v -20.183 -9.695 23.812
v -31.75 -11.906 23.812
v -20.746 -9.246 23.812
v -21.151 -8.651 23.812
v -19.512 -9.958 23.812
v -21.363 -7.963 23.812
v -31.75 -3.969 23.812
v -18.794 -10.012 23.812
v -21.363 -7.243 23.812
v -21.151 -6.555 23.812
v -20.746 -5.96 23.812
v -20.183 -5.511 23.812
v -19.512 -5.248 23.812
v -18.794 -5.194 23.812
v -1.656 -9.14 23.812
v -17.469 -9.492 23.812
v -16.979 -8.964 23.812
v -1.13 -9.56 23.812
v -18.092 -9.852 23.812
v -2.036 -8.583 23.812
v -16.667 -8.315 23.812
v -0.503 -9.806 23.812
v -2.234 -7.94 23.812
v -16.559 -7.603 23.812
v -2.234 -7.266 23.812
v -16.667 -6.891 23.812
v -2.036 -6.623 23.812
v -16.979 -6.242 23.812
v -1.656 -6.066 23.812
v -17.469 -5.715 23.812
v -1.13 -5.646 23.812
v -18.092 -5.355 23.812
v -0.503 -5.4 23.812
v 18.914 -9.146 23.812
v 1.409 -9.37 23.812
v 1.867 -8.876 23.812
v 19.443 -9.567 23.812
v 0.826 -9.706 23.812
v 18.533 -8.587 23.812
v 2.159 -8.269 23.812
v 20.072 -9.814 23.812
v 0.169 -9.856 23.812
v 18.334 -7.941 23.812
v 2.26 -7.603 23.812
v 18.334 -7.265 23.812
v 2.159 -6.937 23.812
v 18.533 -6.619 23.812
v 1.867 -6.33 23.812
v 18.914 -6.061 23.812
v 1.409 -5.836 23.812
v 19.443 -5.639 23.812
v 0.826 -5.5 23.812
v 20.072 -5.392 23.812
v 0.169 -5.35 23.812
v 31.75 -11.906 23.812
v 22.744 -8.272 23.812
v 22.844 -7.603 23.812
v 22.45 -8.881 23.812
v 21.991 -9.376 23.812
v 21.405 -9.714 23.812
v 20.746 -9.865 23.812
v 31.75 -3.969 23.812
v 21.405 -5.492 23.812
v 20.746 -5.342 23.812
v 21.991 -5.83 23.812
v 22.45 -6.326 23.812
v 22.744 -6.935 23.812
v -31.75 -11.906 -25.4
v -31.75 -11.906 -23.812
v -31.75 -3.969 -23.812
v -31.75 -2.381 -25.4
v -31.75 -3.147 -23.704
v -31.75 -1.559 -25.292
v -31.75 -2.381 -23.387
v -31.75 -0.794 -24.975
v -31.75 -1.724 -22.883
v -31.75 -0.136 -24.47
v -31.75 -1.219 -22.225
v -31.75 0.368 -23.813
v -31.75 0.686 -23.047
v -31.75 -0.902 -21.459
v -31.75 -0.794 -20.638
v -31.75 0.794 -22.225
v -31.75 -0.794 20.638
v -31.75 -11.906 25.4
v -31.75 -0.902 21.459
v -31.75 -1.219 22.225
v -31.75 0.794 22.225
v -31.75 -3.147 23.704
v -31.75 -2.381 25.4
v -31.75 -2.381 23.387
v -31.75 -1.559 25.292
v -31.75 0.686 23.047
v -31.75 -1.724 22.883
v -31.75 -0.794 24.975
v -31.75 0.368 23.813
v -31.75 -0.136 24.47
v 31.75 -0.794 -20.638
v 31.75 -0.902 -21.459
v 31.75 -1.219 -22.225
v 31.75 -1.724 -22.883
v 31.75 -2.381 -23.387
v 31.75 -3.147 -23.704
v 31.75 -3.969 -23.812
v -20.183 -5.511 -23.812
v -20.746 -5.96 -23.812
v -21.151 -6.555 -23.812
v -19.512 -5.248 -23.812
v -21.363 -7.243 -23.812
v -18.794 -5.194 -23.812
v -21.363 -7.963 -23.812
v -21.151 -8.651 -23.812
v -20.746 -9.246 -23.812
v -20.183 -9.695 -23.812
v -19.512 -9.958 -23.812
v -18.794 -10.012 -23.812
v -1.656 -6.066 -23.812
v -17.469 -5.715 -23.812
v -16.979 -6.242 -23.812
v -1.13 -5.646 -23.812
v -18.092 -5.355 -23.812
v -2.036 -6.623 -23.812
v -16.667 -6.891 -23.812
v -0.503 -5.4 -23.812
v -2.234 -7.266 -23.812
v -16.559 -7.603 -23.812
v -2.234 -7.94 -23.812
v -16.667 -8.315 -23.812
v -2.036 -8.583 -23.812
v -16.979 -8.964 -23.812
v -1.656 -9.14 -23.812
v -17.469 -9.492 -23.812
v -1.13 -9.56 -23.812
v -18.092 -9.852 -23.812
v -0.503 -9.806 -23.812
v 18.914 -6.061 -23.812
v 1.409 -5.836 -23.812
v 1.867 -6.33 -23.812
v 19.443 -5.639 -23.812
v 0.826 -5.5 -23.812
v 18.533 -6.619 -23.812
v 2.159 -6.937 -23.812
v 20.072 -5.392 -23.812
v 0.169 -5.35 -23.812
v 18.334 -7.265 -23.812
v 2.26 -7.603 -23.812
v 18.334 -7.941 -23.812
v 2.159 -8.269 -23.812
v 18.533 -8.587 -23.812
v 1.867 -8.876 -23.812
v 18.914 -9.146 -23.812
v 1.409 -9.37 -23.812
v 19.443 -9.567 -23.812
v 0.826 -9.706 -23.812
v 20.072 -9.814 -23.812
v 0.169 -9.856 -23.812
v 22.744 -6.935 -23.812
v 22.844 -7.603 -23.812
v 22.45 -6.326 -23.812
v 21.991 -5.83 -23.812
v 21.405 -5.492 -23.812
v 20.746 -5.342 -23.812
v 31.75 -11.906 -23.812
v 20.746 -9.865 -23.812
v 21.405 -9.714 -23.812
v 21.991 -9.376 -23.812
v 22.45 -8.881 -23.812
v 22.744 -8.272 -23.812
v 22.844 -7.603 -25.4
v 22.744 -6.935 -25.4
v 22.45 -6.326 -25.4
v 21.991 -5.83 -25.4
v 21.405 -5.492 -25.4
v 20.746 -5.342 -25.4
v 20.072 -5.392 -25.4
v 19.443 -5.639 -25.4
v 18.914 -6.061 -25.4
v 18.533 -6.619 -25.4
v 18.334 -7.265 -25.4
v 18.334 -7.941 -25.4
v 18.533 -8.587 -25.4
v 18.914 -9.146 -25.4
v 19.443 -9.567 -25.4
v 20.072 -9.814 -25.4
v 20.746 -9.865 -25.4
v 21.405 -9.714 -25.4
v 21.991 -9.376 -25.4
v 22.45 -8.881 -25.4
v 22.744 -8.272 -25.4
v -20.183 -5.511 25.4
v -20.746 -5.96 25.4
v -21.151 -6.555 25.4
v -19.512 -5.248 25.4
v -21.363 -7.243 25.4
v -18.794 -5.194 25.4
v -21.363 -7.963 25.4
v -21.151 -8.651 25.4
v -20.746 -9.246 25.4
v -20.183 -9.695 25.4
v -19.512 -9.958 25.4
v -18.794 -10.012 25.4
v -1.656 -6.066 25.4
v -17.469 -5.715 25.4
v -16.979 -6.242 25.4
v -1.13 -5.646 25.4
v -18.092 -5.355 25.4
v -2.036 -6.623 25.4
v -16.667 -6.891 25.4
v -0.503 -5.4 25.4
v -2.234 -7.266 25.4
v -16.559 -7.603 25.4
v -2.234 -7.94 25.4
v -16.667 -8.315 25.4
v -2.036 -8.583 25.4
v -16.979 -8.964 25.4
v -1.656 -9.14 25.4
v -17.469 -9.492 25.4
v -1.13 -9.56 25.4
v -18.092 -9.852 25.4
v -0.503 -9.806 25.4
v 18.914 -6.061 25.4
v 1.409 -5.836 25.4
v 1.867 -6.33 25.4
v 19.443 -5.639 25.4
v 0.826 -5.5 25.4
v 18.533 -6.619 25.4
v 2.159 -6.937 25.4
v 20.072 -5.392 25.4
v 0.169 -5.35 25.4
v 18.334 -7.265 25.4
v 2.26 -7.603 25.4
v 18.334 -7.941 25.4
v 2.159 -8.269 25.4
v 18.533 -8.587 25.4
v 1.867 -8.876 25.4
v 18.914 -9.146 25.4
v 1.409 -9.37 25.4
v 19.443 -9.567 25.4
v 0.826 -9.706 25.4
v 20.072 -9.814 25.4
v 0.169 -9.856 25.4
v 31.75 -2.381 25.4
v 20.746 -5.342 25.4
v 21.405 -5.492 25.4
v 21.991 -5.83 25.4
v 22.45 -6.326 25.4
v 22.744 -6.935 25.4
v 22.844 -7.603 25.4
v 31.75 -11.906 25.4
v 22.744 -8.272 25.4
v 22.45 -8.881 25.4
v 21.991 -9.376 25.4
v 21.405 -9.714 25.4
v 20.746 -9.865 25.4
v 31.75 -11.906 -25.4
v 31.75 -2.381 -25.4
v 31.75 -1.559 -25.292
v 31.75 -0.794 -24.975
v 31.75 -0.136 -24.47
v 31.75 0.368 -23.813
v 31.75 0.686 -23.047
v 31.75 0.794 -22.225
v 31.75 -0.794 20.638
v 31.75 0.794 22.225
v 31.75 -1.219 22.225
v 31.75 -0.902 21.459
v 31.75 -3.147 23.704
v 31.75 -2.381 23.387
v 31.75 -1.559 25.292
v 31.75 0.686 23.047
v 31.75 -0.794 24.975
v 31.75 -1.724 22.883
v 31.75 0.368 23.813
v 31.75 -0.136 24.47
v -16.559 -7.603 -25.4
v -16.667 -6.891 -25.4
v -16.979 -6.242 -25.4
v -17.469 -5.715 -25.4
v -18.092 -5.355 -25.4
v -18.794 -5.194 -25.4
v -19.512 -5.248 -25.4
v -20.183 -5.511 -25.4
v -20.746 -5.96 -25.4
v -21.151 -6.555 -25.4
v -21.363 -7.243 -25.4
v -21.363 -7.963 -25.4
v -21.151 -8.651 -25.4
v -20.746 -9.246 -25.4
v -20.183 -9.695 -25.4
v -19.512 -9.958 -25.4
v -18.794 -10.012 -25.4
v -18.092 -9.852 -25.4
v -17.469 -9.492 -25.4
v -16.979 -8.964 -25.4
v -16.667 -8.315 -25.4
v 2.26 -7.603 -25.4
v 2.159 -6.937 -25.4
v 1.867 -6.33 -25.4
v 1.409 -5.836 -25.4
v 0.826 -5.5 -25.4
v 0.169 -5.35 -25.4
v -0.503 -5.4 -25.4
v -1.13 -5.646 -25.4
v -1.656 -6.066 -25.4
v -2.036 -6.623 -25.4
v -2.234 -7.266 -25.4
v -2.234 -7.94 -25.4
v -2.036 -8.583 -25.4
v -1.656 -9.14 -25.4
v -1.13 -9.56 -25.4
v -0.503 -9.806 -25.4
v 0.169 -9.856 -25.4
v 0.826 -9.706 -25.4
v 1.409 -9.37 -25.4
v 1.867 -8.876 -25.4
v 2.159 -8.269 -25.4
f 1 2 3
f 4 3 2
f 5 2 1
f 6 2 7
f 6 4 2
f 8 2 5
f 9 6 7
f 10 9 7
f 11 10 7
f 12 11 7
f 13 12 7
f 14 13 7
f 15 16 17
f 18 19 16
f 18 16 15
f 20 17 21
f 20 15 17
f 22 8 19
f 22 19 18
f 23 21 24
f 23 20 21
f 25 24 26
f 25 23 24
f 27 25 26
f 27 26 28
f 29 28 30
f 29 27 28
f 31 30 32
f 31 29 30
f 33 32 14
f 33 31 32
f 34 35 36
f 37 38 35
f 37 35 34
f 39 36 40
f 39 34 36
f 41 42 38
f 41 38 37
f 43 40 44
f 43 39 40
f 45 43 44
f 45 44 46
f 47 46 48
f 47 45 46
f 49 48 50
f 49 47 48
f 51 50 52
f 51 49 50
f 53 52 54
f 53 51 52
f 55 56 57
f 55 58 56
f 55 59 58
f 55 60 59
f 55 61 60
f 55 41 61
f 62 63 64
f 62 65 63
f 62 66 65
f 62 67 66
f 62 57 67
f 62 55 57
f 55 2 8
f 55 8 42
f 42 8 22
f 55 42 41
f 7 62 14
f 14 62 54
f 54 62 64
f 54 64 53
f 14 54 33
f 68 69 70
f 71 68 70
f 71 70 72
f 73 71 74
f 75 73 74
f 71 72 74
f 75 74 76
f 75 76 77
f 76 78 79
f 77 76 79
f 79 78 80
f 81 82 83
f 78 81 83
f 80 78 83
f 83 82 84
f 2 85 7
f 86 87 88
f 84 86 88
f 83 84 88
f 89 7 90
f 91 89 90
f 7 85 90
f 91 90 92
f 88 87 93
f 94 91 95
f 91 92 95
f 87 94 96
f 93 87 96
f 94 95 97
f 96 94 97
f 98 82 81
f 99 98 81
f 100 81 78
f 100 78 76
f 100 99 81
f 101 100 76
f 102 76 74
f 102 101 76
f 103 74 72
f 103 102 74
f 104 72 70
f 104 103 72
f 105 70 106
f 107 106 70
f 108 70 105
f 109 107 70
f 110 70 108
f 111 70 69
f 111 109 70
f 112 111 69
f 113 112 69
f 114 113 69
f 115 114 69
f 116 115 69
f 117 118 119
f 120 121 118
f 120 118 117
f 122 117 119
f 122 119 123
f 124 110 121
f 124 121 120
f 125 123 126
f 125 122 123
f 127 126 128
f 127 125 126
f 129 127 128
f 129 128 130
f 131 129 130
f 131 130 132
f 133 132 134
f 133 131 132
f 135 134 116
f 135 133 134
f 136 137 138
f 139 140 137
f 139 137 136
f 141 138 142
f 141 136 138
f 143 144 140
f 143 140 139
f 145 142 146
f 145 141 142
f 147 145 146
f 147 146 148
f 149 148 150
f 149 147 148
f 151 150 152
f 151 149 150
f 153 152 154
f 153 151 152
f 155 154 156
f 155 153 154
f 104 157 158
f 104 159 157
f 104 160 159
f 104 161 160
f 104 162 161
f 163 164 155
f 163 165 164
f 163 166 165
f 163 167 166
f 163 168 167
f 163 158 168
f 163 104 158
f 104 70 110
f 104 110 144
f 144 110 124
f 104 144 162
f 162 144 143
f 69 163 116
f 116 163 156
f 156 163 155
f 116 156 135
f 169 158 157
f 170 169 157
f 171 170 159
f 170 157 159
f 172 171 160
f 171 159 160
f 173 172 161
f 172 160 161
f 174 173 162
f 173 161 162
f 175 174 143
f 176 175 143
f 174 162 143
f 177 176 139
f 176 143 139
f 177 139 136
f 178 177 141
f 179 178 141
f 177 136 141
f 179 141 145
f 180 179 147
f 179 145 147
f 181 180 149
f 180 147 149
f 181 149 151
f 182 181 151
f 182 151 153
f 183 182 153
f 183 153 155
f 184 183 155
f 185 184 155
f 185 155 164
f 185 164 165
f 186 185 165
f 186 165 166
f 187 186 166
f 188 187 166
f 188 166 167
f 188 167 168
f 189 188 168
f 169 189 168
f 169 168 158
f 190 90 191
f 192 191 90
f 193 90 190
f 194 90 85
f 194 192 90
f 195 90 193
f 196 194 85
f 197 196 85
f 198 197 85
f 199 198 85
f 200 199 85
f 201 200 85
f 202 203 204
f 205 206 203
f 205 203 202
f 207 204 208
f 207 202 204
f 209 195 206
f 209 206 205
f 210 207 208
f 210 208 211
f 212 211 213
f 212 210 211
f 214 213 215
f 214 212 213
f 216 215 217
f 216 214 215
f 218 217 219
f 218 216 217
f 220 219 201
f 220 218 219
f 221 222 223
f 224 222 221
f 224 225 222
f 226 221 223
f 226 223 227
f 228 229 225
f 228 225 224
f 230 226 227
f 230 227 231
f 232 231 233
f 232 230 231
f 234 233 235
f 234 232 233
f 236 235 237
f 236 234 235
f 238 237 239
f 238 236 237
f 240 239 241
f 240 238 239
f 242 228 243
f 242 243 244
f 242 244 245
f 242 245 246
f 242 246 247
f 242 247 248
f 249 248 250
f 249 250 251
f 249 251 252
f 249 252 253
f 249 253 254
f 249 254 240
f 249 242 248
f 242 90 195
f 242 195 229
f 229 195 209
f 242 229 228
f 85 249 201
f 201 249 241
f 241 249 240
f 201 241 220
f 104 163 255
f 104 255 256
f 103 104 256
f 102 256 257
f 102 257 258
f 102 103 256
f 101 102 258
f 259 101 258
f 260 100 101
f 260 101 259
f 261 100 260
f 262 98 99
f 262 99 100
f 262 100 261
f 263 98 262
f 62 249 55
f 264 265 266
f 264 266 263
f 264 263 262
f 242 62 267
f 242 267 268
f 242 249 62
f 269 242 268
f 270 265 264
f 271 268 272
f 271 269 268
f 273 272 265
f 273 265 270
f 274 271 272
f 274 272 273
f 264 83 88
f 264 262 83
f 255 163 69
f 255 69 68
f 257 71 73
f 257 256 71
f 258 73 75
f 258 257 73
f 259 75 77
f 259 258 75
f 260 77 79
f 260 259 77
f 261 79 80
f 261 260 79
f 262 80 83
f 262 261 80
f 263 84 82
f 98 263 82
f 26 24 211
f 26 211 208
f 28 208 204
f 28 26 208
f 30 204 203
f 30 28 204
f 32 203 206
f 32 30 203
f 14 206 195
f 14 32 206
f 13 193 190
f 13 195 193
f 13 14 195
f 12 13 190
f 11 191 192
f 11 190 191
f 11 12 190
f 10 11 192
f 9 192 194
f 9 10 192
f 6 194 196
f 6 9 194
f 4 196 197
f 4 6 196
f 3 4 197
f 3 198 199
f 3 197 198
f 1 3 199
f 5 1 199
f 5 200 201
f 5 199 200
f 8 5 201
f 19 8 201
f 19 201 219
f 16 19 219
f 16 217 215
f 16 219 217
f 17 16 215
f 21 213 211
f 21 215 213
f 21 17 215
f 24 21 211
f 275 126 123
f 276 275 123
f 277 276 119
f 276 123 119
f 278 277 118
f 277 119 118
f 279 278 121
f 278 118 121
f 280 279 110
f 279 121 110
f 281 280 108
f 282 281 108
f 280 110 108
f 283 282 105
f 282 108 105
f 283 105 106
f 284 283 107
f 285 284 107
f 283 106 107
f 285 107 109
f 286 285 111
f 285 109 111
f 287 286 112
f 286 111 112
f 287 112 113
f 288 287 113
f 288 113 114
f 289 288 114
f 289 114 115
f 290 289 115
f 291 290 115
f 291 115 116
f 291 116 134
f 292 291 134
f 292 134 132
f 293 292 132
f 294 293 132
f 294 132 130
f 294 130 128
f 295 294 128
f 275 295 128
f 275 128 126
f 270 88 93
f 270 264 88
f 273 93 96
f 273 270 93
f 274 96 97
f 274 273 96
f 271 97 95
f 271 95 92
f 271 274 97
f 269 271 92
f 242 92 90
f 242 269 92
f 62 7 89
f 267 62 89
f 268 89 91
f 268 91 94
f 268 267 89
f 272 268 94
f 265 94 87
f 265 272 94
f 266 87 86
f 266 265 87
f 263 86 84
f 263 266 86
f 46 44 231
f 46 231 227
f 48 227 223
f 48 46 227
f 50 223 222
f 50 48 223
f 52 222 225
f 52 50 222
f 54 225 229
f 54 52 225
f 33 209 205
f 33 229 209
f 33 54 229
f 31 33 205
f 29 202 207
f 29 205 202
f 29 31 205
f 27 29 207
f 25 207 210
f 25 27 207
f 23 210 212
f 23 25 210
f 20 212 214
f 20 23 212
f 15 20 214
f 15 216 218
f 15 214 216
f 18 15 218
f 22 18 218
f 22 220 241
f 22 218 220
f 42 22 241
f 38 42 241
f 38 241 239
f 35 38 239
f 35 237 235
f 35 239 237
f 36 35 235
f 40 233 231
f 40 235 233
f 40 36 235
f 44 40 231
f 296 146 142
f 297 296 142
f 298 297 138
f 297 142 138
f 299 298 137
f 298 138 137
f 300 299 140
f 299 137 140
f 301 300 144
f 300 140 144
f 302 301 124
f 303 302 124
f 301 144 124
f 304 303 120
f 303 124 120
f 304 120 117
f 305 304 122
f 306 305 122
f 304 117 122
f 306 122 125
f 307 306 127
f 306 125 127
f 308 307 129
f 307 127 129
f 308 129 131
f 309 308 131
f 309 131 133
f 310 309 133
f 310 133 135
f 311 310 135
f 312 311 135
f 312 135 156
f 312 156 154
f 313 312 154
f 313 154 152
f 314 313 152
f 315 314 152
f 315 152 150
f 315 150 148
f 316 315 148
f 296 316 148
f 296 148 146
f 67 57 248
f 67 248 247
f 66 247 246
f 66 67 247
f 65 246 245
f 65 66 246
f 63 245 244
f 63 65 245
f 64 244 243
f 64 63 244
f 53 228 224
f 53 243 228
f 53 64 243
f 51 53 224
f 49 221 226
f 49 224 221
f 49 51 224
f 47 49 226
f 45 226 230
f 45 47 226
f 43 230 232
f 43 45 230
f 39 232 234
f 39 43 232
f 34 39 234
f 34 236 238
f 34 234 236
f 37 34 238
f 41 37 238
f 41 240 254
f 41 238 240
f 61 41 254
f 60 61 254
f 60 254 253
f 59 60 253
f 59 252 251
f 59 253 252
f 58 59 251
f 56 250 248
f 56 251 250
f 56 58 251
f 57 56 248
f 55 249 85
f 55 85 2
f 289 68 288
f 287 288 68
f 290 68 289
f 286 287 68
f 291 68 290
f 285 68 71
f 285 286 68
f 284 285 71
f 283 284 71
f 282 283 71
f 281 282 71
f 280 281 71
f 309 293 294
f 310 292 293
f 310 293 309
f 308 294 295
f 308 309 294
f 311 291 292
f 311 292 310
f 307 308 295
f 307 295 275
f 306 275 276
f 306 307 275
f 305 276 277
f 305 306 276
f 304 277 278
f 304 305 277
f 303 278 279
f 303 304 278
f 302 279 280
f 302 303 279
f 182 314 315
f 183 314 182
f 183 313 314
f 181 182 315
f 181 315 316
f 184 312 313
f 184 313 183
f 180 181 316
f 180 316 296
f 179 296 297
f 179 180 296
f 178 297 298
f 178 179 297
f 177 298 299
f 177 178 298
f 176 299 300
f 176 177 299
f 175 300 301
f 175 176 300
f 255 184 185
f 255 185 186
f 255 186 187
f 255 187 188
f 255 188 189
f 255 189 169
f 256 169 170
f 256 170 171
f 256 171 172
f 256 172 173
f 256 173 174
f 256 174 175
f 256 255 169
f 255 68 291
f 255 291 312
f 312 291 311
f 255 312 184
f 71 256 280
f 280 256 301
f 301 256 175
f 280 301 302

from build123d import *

# Parameters (mm, degrees)
F1_DEPTH      = 31.75
F2_R          = 2.2595381717
F2_R_2        = 2.4154540774
F2_R_3        = 2.2678572685
F3_DEPTH      = 25.401
F3_DEPTH_BACK = 25.401


with BuildPart() as f1:
    # F0 (on Right) → F1 (new body, symmetric)
    with BuildSketch(Plane.YZ):
        with BuildLine():
            Line((-0.79375, 0), (0.79375, 0))
            Line((0.79375, 0), (0.79375, 22.225))
            ThreePointArc((0.79375, 22.225), (-0.1361859697, 24.4700640303), (-2.38125, 25.4))
            Line((-2.38125, 25.4), (-11.90625, 25.4))
            Line((-11.90625, 25.4), (-11.90625, 23.8125))
            Line((-11.90625, 23.8125), (-3.96875, 23.8125))
            ThreePointArc((-3.96875, 23.8125), (-1.7236859697, 22.8825640303), (-0.79375, 20.6375))
            Line((-0.79375, 20.6375), (-0.79375, 0))
        make_face()
        with BuildLine():
            Line((0.79375, -22.225), (0.79375, 0))
            Line((0.79375, 0), (-0.79375, 0))
            Line((-0.79375, 0), (-0.79375, -20.6375))
            ThreePointArc((-0.79375, -20.6375), (-1.7236859697, -22.8825640303), (-3.96875, -23.8125))
            Line((-3.96875, -23.8125), (-11.90625, -23.8125))
            Line((-11.90625, -23.8125), (-11.90625, -25.4))
            Line((-11.90625, -25.4), (-2.38125, -25.4))
            ThreePointArc((-2.38125, -25.4), (-0.1361859697, -24.4700640303), (0.79375, -22.225))
        make_face()
    extrude(amount=F1_DEPTH, both=True)

    # F2 (on Top) → F3 (cut, two sides)
    with BuildSketch(Plane.XY) as f3_sk:
        with Locations((0, -7.6030581258)):
            Circle(F2_R)
        with Locations((-18.9749002457, -7.6030581258)):
            Circle(F2_R_2)
        with Locations((20.5765273422, -7.6030581258)):
            Circle(F2_R_3)
    extrude(amount=-F3_DEPTH, mode=Mode.SUBTRACT)
    extrude(f3_sk.sketch, amount=F3_DEPTH_BACK, mode=Mode.SUBTRACT)


solid = f1.part
